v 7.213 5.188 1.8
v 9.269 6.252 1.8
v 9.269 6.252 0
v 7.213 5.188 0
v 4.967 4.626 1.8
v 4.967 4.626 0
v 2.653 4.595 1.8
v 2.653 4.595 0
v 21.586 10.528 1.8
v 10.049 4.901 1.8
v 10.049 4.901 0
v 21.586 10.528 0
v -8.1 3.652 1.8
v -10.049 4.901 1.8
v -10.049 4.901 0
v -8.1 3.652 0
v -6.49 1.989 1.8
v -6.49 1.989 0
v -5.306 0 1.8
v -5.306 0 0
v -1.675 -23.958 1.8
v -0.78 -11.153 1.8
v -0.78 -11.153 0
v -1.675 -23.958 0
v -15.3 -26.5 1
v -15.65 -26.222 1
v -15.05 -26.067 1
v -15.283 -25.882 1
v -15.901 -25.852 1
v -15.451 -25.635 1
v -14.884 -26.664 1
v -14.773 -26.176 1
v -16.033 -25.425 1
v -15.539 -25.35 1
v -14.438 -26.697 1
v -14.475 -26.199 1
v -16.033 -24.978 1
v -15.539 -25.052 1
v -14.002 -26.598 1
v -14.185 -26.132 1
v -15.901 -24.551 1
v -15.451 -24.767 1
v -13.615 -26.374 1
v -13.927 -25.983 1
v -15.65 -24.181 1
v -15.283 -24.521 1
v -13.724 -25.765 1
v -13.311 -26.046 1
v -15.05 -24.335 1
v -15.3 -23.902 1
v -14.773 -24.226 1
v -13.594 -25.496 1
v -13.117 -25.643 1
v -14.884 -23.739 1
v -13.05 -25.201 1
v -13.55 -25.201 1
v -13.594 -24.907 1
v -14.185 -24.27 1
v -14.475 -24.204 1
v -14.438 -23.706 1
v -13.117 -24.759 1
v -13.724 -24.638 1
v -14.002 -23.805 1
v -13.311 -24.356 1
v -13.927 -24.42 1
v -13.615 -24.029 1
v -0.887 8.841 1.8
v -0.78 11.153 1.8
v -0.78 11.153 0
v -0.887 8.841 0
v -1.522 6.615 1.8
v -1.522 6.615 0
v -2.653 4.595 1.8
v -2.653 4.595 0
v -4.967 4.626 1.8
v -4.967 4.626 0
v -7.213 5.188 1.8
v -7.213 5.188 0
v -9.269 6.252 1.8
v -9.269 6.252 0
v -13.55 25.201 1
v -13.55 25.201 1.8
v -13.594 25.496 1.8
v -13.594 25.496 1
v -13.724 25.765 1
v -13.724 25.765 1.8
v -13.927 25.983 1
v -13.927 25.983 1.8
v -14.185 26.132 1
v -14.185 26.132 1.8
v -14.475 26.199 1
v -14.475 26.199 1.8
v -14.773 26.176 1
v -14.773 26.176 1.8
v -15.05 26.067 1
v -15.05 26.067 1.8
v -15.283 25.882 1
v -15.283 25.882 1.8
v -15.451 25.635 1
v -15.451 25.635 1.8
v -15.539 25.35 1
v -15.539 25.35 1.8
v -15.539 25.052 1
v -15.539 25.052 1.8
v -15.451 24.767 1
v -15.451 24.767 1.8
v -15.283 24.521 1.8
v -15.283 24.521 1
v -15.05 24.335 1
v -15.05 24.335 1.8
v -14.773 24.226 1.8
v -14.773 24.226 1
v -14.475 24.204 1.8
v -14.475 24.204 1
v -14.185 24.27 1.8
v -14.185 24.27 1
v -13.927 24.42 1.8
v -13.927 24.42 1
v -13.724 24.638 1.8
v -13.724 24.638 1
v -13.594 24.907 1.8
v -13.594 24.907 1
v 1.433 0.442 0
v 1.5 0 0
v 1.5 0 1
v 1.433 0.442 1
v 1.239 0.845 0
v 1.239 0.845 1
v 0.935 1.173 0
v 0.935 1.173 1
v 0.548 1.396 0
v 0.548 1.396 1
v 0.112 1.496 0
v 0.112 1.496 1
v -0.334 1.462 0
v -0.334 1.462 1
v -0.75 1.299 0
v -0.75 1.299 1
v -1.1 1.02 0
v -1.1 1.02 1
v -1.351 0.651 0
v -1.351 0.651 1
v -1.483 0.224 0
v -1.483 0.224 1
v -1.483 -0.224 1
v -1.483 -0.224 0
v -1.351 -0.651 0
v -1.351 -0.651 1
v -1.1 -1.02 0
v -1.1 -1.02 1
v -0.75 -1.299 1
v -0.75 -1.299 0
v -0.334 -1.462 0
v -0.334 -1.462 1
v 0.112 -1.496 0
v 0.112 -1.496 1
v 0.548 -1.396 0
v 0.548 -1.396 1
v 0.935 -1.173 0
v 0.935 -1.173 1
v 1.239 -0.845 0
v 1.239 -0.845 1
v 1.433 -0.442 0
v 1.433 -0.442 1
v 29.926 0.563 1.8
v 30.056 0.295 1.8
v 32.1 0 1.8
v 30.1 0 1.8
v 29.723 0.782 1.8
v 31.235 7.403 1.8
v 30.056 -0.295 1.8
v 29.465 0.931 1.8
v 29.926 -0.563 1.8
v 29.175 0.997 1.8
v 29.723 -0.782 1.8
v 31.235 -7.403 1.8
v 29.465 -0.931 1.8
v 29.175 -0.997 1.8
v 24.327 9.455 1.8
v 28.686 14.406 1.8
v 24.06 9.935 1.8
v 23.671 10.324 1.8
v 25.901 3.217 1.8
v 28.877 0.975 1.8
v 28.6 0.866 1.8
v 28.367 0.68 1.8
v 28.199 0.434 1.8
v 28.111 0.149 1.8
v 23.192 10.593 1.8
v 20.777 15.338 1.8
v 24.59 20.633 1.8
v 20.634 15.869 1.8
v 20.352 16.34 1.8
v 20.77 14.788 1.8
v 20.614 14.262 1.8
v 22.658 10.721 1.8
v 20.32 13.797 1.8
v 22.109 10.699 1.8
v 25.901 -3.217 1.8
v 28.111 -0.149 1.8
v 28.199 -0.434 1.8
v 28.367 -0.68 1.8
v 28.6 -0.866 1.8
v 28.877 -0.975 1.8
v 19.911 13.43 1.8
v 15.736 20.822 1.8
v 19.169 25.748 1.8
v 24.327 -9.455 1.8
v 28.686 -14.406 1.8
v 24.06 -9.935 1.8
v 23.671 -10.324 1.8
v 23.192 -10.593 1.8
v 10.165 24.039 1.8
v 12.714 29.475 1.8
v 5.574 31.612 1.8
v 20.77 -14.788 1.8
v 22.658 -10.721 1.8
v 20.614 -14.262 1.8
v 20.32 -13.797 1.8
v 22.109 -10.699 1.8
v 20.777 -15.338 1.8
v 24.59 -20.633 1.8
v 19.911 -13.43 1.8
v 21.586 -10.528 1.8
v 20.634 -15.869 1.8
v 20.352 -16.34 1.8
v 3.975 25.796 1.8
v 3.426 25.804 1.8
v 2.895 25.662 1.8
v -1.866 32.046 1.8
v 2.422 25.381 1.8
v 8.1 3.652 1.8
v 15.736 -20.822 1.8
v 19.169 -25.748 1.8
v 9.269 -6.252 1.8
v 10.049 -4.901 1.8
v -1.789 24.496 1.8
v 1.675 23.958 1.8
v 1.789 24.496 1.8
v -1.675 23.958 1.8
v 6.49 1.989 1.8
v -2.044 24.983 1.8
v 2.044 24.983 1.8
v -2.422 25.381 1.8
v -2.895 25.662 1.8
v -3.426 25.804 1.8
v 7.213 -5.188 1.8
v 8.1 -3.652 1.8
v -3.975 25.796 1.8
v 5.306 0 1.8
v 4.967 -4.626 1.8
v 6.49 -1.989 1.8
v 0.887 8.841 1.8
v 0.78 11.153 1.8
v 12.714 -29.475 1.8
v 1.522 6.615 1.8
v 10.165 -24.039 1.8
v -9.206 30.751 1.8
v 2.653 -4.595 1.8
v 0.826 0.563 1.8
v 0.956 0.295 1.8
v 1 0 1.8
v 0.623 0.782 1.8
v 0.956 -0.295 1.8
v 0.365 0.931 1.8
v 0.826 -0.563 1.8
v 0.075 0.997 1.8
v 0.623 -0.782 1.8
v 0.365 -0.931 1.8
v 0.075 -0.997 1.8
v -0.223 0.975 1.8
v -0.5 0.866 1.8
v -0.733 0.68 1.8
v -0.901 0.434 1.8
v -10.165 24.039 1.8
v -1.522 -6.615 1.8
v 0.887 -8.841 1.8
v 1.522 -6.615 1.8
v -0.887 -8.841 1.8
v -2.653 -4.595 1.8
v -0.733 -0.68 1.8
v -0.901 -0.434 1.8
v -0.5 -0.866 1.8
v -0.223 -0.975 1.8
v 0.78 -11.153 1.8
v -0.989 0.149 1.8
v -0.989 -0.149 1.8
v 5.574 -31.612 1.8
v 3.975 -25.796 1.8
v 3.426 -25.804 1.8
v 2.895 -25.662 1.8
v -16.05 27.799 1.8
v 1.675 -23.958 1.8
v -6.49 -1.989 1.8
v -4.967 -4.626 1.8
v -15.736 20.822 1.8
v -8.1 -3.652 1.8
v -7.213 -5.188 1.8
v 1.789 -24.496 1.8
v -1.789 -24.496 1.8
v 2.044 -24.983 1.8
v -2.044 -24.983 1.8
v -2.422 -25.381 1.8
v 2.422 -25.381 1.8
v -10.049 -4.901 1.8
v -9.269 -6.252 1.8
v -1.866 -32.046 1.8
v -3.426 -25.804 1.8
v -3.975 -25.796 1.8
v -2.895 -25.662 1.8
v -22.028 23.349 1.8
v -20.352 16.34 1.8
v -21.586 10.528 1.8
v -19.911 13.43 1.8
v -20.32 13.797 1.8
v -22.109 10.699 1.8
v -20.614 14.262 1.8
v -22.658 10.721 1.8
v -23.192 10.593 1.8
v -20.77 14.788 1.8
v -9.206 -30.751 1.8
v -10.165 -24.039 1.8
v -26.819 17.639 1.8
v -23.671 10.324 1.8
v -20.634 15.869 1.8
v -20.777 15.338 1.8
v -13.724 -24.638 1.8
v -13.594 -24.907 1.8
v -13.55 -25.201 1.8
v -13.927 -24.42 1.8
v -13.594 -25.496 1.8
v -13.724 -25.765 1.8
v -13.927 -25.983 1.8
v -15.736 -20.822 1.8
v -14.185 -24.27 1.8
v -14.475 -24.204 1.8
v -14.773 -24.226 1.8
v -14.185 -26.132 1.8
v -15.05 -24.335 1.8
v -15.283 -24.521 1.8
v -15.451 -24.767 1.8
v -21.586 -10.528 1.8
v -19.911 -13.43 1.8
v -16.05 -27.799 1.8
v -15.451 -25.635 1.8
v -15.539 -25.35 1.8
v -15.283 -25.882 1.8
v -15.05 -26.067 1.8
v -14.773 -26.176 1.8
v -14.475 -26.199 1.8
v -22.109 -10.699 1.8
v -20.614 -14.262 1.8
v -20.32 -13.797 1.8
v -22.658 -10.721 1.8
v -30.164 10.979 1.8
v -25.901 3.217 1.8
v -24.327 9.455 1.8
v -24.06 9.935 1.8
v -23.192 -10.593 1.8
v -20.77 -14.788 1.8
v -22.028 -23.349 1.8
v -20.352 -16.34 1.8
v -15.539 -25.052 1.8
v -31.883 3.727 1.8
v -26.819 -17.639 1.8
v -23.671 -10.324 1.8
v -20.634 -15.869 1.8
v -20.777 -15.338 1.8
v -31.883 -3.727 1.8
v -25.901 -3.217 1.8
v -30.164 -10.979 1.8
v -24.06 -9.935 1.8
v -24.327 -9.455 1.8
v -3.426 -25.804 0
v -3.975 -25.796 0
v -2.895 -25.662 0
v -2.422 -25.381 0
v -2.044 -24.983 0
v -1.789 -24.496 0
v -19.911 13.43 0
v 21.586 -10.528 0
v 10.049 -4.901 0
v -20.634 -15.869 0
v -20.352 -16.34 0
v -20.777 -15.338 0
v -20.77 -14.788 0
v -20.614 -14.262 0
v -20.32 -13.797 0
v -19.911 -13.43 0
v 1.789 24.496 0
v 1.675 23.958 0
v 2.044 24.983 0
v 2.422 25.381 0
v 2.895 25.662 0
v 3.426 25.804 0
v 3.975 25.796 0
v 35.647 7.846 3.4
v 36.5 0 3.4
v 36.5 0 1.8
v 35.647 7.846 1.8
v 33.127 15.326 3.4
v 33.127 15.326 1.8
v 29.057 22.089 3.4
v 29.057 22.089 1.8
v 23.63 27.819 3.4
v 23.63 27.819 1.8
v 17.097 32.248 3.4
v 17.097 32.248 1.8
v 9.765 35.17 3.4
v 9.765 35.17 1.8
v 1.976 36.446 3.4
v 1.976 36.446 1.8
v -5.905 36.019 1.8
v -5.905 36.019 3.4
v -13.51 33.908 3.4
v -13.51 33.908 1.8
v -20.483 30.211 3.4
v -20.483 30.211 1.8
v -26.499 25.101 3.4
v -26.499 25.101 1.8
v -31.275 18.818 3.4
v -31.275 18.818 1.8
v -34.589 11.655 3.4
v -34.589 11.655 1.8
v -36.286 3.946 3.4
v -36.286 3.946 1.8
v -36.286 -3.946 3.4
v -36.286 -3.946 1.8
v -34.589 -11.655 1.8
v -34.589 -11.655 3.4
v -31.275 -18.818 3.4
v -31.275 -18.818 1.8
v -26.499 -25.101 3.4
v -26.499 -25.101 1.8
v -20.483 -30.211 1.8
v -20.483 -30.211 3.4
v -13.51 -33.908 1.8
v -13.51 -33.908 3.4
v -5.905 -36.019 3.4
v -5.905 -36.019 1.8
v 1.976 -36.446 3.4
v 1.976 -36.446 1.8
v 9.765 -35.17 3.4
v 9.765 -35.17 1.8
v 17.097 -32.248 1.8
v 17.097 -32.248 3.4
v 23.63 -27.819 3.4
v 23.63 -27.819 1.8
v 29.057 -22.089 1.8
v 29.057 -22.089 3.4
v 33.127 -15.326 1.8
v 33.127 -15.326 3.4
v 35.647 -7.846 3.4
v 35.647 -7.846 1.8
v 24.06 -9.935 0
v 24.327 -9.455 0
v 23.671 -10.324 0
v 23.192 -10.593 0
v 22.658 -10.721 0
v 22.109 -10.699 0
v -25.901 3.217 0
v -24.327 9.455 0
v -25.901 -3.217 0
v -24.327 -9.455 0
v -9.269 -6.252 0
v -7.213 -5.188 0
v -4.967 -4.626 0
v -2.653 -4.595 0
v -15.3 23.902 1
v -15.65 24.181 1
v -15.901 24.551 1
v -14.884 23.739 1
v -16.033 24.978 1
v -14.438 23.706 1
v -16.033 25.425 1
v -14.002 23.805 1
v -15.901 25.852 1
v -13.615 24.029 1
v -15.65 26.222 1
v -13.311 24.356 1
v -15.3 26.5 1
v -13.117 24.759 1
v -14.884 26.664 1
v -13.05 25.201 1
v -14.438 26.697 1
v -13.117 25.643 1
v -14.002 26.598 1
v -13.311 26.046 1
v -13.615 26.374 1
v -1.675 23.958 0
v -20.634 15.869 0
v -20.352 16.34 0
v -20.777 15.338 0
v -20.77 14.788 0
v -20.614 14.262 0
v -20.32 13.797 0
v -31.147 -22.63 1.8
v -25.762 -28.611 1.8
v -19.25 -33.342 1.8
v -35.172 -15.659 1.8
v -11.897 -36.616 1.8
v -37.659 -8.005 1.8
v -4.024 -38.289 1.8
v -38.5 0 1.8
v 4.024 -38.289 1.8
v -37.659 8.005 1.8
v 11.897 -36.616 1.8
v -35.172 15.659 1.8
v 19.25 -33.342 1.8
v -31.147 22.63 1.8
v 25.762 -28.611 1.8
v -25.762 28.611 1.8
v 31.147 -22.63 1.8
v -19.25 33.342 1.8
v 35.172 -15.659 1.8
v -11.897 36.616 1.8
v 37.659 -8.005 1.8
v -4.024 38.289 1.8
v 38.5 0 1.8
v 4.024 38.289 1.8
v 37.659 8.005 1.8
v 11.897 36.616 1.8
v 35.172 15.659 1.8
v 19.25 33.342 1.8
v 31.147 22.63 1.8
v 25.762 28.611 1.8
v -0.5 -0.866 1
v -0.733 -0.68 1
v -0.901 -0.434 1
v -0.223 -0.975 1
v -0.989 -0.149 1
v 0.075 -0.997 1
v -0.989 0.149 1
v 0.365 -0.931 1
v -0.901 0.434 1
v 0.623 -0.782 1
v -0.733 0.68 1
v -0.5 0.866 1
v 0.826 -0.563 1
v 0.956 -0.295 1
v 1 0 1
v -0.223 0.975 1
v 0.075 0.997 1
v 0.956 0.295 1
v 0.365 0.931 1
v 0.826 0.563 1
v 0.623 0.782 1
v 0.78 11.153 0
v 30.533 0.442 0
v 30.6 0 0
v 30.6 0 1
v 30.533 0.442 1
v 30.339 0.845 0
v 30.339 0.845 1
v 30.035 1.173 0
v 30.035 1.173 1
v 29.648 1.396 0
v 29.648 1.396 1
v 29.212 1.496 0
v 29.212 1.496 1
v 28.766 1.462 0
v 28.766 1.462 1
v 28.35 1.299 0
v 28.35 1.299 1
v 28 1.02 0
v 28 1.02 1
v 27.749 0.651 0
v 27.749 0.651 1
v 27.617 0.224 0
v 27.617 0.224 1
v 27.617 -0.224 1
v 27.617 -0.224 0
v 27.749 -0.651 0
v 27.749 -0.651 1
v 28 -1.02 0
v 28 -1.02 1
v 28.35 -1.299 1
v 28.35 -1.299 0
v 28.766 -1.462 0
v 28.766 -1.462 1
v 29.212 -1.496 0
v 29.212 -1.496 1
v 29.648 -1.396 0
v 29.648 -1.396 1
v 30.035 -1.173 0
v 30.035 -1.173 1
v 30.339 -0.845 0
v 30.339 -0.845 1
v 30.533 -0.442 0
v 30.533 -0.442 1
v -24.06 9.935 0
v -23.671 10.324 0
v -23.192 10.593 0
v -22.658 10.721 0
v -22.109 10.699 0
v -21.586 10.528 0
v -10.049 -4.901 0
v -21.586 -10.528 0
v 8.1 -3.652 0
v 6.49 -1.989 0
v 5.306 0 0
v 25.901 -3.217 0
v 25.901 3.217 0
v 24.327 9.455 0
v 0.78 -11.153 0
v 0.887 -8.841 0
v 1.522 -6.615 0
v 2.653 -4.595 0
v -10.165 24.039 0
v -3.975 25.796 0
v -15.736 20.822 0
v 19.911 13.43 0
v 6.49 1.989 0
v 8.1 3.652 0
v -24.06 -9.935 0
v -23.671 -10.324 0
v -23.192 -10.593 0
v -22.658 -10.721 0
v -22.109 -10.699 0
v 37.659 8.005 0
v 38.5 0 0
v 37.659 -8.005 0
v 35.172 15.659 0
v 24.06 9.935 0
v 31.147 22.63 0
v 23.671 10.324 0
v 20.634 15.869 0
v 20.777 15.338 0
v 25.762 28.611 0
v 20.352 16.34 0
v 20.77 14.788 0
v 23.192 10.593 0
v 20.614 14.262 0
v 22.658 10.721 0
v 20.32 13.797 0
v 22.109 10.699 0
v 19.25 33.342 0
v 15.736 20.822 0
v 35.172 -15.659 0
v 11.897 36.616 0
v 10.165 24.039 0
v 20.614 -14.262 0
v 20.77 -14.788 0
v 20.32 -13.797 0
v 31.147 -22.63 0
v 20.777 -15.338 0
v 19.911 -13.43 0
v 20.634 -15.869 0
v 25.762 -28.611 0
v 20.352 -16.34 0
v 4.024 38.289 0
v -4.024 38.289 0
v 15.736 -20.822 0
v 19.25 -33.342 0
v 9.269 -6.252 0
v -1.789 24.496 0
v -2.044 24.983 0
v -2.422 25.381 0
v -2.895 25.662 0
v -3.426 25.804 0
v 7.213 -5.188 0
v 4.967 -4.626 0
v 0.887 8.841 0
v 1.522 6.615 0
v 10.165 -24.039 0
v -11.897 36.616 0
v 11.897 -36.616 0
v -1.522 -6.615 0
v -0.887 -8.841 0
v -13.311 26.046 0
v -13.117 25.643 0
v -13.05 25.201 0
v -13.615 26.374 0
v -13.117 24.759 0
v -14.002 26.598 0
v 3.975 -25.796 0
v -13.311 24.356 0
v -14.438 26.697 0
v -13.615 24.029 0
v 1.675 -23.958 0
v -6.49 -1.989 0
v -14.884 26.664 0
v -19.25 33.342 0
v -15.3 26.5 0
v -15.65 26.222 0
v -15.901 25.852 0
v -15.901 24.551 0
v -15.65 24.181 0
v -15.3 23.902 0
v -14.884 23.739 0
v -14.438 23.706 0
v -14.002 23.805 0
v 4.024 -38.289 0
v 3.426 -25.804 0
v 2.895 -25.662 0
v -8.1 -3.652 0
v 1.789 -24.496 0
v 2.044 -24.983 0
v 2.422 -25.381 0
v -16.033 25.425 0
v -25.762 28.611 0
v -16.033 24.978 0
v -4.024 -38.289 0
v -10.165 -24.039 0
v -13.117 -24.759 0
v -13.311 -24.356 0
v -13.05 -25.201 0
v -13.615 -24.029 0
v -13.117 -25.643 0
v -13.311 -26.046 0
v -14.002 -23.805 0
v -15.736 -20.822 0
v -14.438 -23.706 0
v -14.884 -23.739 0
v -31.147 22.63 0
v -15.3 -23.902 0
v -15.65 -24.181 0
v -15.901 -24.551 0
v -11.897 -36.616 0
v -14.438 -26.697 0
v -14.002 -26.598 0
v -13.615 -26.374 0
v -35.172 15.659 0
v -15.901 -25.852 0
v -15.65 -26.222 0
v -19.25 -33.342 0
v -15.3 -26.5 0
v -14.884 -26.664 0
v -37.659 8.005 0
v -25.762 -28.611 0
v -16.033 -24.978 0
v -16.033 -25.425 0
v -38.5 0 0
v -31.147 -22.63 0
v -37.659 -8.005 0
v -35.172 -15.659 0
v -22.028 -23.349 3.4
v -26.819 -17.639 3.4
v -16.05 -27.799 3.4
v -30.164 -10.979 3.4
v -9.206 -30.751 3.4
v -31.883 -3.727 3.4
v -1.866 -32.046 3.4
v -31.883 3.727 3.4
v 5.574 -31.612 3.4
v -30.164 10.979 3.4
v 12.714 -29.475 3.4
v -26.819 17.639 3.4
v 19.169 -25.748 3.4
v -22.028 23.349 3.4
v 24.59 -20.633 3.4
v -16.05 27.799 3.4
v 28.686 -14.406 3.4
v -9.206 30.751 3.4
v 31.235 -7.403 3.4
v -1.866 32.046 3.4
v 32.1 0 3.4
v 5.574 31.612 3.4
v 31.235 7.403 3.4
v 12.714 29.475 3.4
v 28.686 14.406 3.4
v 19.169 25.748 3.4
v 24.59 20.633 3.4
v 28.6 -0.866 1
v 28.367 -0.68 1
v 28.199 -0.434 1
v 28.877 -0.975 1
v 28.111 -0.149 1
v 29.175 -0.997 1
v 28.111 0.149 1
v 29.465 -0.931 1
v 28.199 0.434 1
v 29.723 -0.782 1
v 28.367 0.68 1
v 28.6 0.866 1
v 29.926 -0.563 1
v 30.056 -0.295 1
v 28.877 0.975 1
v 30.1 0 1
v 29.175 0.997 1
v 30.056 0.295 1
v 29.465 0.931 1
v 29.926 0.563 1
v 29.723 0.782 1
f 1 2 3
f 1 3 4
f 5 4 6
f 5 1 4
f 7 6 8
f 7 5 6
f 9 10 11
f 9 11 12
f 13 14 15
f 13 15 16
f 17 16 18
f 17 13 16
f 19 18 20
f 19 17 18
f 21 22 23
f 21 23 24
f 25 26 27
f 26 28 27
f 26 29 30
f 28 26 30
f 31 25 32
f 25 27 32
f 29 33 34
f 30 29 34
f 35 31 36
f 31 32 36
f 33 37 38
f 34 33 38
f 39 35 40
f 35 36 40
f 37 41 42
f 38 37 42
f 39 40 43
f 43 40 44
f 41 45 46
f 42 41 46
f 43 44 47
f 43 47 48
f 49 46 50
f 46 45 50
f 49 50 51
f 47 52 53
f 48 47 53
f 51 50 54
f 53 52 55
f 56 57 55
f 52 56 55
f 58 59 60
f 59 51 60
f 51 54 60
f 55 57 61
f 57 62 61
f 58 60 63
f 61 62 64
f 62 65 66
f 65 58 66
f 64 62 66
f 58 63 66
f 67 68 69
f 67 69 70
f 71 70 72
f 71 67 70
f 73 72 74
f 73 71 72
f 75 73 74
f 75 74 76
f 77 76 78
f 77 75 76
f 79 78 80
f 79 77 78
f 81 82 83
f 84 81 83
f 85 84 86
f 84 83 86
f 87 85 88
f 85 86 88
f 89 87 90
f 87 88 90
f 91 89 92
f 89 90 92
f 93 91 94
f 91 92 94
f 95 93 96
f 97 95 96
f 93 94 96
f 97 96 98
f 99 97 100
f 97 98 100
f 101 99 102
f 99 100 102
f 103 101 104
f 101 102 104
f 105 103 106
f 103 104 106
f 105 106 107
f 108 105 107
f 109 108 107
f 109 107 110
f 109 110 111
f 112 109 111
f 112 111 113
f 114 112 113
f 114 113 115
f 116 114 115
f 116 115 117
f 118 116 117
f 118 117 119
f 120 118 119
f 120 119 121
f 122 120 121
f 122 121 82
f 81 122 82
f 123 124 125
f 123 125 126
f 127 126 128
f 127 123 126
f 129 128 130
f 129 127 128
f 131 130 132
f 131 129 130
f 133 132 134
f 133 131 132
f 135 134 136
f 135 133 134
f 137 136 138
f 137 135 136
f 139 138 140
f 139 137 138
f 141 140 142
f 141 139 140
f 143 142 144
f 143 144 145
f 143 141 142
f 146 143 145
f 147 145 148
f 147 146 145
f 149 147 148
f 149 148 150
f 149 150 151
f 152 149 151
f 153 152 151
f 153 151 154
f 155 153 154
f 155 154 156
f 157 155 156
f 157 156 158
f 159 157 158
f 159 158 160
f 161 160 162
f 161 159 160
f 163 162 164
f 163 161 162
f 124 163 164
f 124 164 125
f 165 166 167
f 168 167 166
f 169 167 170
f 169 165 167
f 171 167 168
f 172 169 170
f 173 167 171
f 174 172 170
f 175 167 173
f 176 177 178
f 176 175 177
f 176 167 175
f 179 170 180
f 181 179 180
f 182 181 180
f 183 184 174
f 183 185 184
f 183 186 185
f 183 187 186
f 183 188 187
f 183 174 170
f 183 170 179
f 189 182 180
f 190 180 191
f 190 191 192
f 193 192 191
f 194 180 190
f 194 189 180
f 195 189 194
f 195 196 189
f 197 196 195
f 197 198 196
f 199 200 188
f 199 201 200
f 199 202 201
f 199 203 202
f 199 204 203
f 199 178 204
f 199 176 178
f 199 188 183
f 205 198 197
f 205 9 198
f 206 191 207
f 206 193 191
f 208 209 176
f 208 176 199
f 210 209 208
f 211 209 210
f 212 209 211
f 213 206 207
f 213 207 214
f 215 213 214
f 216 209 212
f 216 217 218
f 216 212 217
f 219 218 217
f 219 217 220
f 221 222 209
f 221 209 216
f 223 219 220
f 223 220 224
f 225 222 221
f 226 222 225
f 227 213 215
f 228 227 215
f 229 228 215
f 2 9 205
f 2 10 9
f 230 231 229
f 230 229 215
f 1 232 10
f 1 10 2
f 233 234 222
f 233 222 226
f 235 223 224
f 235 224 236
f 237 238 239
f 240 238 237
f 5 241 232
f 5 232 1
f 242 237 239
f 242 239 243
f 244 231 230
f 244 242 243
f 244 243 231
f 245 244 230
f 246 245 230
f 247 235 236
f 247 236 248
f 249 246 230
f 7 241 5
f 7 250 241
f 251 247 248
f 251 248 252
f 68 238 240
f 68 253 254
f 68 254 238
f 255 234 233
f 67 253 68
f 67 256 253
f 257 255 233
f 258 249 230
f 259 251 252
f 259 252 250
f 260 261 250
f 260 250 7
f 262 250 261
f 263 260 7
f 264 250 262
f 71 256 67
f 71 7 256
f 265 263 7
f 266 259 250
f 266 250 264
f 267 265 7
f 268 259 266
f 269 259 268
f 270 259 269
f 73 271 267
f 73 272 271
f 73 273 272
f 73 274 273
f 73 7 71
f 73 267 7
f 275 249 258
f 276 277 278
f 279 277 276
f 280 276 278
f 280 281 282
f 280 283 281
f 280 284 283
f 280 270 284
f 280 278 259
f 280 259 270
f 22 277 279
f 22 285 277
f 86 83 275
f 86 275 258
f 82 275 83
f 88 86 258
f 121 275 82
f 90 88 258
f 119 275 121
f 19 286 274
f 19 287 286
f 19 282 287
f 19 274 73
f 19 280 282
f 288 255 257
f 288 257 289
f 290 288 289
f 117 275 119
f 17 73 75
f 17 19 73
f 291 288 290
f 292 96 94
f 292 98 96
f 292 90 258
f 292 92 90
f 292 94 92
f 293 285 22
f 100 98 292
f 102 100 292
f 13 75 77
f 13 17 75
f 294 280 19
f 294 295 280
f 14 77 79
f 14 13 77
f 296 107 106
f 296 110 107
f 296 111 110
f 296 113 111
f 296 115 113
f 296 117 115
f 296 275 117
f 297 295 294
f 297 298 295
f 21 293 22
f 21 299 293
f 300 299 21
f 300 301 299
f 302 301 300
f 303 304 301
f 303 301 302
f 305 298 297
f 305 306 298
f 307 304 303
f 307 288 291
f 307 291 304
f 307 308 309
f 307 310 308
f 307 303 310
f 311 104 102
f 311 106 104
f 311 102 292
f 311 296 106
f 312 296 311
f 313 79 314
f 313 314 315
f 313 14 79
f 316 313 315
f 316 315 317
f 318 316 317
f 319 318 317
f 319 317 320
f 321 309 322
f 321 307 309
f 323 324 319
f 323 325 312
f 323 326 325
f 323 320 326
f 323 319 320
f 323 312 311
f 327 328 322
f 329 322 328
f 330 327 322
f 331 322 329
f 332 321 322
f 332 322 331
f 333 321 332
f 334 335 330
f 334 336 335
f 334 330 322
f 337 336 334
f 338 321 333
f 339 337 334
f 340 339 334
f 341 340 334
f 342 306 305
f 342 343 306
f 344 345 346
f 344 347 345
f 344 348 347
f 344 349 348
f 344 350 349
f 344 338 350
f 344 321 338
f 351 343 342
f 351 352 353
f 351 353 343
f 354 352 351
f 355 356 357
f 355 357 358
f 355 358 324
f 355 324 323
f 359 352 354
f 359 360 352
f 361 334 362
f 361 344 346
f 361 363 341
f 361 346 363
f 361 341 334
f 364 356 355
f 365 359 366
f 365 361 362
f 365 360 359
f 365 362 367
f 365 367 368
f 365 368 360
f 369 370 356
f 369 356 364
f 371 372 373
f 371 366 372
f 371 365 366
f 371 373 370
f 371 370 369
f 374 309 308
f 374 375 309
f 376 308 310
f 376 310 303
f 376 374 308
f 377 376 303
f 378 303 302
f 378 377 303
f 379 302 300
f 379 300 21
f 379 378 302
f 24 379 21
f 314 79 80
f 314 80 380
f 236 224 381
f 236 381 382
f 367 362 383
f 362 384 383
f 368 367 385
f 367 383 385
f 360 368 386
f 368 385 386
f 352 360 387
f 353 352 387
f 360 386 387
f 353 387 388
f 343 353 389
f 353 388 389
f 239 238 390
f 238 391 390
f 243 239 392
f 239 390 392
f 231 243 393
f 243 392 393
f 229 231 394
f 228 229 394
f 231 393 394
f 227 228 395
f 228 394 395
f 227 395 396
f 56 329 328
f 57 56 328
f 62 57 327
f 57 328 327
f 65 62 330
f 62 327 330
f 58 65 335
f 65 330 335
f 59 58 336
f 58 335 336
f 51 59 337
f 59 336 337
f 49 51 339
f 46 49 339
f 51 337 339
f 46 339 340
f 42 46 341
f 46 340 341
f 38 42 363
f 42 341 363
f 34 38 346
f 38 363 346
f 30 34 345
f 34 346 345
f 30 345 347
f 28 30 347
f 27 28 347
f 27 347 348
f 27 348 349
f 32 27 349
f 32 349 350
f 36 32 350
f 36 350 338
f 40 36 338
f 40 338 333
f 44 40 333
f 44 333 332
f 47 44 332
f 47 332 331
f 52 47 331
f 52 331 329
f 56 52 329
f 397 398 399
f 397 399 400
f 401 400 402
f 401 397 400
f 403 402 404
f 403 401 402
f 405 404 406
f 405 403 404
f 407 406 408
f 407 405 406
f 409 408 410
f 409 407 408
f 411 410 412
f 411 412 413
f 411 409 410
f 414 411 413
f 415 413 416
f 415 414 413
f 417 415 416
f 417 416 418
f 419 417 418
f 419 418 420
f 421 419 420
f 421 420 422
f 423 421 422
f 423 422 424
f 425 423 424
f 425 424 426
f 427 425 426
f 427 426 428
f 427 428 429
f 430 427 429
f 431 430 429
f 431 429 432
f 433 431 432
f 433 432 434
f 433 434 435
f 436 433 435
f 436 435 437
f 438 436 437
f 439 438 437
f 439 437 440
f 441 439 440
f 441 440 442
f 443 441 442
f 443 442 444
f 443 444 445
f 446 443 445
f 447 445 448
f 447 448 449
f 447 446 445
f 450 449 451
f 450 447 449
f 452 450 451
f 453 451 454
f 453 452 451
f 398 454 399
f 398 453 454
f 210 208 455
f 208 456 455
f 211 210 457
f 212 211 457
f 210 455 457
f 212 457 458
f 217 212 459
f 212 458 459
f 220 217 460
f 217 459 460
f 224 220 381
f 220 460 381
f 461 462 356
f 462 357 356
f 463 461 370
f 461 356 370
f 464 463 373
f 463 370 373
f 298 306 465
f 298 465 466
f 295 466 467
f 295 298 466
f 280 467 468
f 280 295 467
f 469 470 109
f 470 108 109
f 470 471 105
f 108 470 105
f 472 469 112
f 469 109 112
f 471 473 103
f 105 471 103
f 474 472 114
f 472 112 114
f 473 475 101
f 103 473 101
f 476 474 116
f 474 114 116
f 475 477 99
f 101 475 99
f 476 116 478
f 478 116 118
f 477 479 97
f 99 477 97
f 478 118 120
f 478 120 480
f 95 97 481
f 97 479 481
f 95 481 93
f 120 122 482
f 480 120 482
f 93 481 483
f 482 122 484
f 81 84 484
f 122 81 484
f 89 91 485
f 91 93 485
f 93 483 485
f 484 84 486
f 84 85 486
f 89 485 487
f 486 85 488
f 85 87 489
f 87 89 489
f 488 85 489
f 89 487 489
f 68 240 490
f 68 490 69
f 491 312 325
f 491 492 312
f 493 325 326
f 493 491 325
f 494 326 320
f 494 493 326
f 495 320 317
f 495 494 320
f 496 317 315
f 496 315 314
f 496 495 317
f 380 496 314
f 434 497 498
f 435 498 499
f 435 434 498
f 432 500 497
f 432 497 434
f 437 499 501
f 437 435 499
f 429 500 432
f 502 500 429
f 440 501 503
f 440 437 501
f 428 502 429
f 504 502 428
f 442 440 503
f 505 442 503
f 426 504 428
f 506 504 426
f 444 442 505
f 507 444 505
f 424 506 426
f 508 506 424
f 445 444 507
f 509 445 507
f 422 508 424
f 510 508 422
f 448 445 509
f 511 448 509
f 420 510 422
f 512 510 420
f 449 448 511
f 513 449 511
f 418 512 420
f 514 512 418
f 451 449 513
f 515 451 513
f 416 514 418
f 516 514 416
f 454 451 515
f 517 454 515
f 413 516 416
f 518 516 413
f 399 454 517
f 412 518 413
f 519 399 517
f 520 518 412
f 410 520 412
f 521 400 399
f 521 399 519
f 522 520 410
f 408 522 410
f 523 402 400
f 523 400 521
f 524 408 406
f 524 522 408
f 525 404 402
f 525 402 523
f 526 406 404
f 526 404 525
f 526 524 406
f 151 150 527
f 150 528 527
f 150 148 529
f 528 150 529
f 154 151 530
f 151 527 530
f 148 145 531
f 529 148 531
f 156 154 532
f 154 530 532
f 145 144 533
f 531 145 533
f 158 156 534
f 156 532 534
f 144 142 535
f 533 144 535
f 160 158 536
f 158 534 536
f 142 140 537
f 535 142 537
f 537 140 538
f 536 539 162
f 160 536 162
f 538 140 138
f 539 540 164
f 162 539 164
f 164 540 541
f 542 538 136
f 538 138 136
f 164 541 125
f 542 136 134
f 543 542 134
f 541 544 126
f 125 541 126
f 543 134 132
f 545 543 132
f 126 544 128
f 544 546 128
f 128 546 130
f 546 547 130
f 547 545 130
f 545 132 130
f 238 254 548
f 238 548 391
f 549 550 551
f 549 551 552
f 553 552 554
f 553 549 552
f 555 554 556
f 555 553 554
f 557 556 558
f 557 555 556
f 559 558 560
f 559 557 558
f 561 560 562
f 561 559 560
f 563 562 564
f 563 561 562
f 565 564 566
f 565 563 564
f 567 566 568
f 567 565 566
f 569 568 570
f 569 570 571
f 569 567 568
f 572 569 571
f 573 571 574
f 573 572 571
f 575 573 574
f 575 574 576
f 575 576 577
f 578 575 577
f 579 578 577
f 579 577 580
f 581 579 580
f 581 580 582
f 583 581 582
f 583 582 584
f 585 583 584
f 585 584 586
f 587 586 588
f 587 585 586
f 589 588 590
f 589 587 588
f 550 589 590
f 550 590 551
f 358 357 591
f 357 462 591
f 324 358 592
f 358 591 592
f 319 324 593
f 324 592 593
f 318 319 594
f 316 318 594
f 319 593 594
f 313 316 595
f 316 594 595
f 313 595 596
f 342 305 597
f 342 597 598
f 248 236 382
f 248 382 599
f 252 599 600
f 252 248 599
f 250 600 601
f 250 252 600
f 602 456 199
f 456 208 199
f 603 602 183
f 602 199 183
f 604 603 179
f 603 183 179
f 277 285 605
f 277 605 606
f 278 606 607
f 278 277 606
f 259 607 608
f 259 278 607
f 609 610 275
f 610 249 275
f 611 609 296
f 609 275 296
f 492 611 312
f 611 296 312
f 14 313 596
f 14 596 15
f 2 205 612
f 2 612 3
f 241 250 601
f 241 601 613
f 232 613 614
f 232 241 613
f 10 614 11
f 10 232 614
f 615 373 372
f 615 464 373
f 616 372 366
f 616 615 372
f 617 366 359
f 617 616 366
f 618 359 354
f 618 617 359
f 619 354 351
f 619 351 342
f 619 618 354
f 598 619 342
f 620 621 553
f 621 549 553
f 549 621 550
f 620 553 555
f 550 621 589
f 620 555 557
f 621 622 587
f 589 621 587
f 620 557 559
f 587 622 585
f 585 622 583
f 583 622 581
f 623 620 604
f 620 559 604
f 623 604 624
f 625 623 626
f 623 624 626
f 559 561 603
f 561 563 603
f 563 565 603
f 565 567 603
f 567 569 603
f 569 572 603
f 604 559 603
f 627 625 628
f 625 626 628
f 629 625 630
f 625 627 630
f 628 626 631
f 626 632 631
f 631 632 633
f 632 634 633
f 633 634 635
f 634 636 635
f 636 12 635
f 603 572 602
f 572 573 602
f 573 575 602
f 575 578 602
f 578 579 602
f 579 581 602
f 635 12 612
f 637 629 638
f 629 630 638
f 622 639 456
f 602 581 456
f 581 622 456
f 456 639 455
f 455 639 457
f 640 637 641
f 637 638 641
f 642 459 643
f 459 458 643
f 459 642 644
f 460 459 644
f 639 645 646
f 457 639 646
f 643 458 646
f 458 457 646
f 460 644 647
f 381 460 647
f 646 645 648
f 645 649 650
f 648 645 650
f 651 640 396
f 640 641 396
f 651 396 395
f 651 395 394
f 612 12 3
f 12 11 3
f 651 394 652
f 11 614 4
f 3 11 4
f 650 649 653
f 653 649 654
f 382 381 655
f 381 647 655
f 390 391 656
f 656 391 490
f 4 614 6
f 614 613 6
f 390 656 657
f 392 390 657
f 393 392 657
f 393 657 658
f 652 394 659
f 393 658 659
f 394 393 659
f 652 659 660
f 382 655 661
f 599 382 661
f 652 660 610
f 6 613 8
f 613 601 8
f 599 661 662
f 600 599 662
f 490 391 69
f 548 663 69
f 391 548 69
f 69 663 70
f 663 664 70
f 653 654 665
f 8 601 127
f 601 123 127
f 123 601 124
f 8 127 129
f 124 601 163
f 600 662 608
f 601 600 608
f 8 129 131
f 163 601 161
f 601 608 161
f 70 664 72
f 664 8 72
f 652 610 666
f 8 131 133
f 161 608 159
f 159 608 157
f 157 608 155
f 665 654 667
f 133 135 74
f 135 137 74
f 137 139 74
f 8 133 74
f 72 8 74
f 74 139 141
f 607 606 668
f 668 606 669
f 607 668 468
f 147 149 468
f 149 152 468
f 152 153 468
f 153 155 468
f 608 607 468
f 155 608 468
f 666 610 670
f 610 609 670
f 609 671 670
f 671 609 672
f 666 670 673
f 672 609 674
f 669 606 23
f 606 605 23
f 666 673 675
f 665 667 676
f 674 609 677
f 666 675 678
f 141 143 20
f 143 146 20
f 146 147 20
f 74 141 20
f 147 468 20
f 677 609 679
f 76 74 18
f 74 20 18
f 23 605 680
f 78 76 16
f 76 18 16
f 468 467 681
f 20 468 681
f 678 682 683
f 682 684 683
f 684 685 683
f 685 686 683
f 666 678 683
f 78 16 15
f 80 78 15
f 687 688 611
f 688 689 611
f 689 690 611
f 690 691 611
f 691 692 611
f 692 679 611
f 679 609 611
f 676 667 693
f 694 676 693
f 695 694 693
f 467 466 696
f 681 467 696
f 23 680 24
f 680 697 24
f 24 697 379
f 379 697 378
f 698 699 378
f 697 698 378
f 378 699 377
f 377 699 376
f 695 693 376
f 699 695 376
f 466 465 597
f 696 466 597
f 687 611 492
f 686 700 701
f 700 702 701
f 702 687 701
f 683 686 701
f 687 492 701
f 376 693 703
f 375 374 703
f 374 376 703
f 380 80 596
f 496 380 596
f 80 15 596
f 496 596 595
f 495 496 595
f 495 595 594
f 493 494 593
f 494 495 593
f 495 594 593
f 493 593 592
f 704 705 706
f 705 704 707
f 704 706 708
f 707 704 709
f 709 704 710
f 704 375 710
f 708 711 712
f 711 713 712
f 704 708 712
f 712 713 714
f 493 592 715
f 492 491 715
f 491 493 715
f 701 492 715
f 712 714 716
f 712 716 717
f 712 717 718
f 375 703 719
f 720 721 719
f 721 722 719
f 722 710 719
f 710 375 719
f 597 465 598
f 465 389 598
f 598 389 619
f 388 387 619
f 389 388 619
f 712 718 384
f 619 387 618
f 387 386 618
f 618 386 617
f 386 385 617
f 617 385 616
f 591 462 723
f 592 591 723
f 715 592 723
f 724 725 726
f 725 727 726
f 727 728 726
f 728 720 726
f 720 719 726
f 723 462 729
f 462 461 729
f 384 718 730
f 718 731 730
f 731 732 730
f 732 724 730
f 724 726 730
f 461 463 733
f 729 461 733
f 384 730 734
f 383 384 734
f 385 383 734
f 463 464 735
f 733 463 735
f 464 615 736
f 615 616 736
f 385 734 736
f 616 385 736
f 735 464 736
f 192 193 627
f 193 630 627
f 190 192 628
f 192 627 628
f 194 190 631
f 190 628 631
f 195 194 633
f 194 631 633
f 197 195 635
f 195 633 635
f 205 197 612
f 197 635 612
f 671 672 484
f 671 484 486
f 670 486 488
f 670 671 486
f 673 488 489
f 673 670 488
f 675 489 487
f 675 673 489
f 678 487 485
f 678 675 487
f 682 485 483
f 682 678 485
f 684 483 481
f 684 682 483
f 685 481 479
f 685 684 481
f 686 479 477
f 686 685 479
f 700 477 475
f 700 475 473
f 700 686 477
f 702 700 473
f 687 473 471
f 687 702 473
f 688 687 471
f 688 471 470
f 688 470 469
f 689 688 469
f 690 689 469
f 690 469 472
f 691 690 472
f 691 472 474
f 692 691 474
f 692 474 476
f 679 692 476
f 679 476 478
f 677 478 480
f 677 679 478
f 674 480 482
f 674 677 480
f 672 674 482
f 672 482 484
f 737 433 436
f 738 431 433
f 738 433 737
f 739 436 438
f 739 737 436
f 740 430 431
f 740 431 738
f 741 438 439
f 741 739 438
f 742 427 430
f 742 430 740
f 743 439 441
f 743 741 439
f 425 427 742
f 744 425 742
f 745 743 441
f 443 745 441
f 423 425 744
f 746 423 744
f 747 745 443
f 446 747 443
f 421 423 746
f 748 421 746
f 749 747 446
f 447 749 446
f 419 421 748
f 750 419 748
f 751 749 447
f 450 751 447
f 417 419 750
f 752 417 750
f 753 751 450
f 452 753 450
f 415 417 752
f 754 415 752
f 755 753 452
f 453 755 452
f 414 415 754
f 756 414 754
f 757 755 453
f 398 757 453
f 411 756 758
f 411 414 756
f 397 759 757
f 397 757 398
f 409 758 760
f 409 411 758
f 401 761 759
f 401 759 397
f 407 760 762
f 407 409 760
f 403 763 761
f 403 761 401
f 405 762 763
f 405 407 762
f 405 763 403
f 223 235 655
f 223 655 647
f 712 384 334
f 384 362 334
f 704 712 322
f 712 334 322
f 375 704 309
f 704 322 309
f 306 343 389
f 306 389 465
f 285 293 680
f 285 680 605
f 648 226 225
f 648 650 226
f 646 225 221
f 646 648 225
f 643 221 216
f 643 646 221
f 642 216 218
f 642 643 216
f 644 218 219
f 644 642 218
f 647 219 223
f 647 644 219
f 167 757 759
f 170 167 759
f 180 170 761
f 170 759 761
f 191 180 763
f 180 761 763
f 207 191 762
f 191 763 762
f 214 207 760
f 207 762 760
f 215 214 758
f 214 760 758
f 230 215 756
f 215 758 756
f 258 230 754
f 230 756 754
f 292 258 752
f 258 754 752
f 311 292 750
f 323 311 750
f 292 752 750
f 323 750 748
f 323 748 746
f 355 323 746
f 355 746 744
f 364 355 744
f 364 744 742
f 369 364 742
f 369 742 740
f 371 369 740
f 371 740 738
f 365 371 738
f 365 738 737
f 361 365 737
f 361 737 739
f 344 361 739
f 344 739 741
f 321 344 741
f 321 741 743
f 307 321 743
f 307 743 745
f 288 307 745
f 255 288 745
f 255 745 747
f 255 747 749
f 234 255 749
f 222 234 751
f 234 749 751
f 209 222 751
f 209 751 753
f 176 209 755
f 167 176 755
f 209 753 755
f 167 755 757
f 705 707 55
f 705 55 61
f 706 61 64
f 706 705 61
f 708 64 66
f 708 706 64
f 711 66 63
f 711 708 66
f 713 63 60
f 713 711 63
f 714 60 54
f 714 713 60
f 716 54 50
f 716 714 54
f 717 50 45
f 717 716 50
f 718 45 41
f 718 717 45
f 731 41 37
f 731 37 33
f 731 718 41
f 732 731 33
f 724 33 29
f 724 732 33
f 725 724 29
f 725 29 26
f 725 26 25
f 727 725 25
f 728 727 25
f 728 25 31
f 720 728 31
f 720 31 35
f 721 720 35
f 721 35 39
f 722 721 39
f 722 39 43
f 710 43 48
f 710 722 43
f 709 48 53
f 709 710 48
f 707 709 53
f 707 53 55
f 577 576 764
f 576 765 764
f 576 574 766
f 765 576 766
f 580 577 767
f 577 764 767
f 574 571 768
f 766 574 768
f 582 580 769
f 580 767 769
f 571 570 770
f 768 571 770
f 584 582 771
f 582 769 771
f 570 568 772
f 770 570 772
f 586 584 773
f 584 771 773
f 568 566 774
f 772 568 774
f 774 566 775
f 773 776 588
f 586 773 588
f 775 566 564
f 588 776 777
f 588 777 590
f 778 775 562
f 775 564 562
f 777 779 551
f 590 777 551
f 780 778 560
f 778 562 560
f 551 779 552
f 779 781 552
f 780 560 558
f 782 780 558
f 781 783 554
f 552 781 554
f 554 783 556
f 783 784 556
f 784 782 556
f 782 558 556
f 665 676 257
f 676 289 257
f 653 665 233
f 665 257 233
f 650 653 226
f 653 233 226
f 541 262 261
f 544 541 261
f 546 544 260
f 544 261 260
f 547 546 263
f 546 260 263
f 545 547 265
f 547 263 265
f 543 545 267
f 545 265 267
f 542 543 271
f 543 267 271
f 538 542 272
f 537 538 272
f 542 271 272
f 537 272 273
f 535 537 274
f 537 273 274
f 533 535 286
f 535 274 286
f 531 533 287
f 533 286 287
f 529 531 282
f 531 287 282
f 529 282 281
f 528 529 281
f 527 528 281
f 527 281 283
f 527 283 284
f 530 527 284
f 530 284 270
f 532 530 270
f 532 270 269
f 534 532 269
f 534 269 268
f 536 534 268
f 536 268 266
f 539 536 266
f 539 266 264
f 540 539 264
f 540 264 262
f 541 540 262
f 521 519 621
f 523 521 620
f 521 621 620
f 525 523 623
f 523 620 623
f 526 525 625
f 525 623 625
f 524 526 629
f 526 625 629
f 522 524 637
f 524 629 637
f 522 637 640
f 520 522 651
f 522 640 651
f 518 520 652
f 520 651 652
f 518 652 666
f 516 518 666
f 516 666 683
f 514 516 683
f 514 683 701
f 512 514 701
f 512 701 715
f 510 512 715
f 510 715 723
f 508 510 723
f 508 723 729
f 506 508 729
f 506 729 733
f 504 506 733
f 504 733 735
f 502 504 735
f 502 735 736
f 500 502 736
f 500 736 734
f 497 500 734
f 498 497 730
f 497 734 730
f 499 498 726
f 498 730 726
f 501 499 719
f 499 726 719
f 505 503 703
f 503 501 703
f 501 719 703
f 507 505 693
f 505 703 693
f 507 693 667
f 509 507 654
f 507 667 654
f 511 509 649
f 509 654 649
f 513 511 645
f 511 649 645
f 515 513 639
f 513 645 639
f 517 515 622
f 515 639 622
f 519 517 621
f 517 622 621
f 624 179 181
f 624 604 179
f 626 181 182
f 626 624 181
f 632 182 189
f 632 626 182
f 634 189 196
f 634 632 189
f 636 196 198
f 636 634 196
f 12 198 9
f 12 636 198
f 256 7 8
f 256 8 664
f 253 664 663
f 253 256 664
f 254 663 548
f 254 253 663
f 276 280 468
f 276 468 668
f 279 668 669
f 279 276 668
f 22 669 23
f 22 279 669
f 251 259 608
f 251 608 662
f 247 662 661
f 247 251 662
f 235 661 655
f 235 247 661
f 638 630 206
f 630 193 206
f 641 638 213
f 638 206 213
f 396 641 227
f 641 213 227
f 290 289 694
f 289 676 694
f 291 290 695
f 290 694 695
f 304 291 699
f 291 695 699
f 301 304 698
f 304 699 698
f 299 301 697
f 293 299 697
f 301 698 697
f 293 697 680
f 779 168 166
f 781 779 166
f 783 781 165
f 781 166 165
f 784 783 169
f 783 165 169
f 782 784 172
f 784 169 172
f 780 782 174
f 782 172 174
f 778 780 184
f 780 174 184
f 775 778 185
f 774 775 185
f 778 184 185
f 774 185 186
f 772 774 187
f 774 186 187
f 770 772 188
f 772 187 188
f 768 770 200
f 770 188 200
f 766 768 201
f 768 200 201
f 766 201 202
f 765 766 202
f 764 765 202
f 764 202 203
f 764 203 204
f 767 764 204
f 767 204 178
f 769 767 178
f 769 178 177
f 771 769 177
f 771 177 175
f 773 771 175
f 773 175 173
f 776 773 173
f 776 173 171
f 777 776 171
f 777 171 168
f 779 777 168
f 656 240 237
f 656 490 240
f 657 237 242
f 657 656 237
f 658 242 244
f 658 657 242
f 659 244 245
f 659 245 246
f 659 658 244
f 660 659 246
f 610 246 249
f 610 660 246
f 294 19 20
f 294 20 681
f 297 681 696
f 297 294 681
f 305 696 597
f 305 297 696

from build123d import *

# Parameters (mm, degrees)
SKETCH_1_R                       = 38.5
EXTRUDE_1_DEPTH                  = 2
SKETCH_2_OUTSIDE_W               = 100.782
SKETCH_2_OUTSIDE_H               = 100.782
SKETCH_2_OUTSIDE_R               = 36.5
SKETCH_2_OUTSIDE_R_2             = 32.1
CUT_EXTRUDE_1_DEPTH              = 0.2
EXTRUDE_START                    = 1.4
SKETCH_2_2_R                     = 36.5
SKETCH_2_2_R_2                   = 32.1
EXTRUDE_2_DEPTH                  = 1.4
SKETCH_3_R                       = 26.1
CUT_EXTRUDE_2_DEPTH              = 55.47696761
SKETCH_3_3_R                     = 5
EXTRUDE_3_DEPTH                  = 1.8
EXTRUDE_4_DEPTH                  = 1.8
FILLET_1_R                       = 2
PATTERN_CIRCULAR_1_COUNT         = 6
FILLET_1_OF_PATTERN_CIRCULAR_1_R = 2
FILLET_2_R                       = 10
SKETCH_4_R                       = 1
CUT_EXTRUDE_3_DEPTH              = 55.47696761
CUT_EXTRUDE_START                = -1.8
SKETCH_4_3_R                     = 1.5
CUT_EXTRUDE_4_DEPTH              = 1


with BuildPart() as part:
    # 草图1 → 凸台-拉伸1 (new body)
    with BuildSketch(Plane.XY):
        Circle(SKETCH_1_R)
    extrude(amount=EXTRUDE_1_DEPTH)

    # 草图2 outside → 切除-拉伸1 (cut)
    # profile 1 of 2: a face of its own
    with BuildSketch(Plane.XY.offset(2)):
        Rectangle(SKETCH_2_OUTSIDE_W, SKETCH_2_OUTSIDE_H)
        Circle(SKETCH_2_OUTSIDE_R, mode=Mode.SUBTRACT)
    # profile 2 of 2: a face of its own
    with BuildSketch(Plane.XY.offset(2)):
        Circle(SKETCH_2_OUTSIDE_R_2)
    extrude(amount=-CUT_EXTRUDE_1_DEPTH, mode=Mode.SUBTRACT)

    # 草图2<2> → 凸台-拉伸2 (add)
    with BuildSketch(Plane.XY.offset(2).offset(EXTRUDE_START)):
        Circle(SKETCH_2_2_R)
        Circle(SKETCH_2_2_R_2, mode=Mode.SUBTRACT)
    extrude(amount=-EXTRUDE_2_DEPTH)

    # 草图3 → 切除-拉伸2 (cut, through all)
    with BuildSketch(Plane.XY.offset(1.8)):
        Circle(SKETCH_3_R)
    extrude(amount=-CUT_EXTRUDE_2_DEPTH, mode=Mode.SUBTRACT)



with BuildPart() as body_2:
    # 草图3<3> → 凸台-拉伸3 (new, through all)
    with BuildSketch(Plane.XY.offset(1.8)):
        Circle(SKETCH_3_3_R)
    extrude(amount=-EXTRUDE_3_DEPTH)


with BuildPart() as part_1:
    add(part.part)

    add(body_2.part)  # 凸台-拉伸4 merges body 2
    # 草图3<4> → 凸台-拉伸4 (add, through all)
    with BuildSketch(Plane.XY.offset(1.8)):
        with BuildLine():
            ThreePointArc((1.820643965, 26.036421712), (0, 26.1), (-1.820643965, 26.036421712))
            Line((-1.820643965, 26.036421712), (-0.348782369, 4.987820251))
            ThreePointArc((-0.348782369, 4.987820251), (0, 5), (0.348782369, 4.987820251))
            Line((0.348782369, 4.987820251), (1.820643965, 26.036421712))
        make_face()
    extrude_4 = extrude(amount=-EXTRUDE_4_DEPTH)

    # 圆角1
    fillet_1_edges = [part_1.edges().sort_by_distance(p)[0] for p in [
        (-1.820643965, 26.036421712, 0.9),
        (1.820643965, 26.036421712, 0.9),
    ]]
    fillet(fillet_1_edges, radius=FILLET_1_R)

    # 阵列(圆周)1: 凸台-拉伸4 ×6 about axis
    pattern_circular_1_axis = Axis((0, 0, 0), (0, 0, 1))
    for i in range(1, PATTERN_CIRCULAR_1_COUNT):
        add(extrude_4.rotate(pattern_circular_1_axis, i * 360 / PATTERN_CIRCULAR_1_COUNT))

    # 圆角1 of 阵列(圆周)1
    fillet_1_of_pattern_circular_1_edges = [part_1.edges().sort_by_distance(p)[0] for p in [
        (-23.458524608, 11.441486931, 0.9),
        (-21.637880644, 14.594934781, 0.9),
        (-21.637880644, -14.594934781, 0.9),
        (-23.458524608, -11.441486931, 0.9),
        (1.820643965, -26.036421712, 0.9),
        (-1.820643965, -26.036421712, 0.9),
        (23.458524608, -11.441486931, 0.9),
        (21.637880644, -14.594934781, 0.9),
        (21.637880644, 14.594934781, 0.9),
        (23.458524608, 11.441486931, 0.9),
    ]]
    fillet(fillet_1_of_pattern_circular_1_edges, radius=FILLET_1_OF_PATTERN_CIRCULAR_1_R)

    # 圆角2
    # the kernel refuses this fillet: 10 mm, written as the material it adds along each edge
    with BuildSketch(Plane(origin=(4.493970231, -2.191855734, 1.8), x_dir=(0.8987940462991597, -0.4383711467890922, 0), z_dir=(0, 0, -1)), Plane(origin=(0.348782369, -4.987820251, 1.8), x_dir=(0.06975647374410966, -0.9975640502598253, 0), z_dir=(0, 0, -1)), Plane(origin=(-4.145187863, -2.795964517, 1.8), x_dir=(-0.8290375725550504, -0.5591929034707338, 0), z_dir=(0, 0, -1)), Plane(origin=(-4.493970231, 2.191855734, 1.8), x_dir=(-0.8987940462991602, 0.4383711467890914, 0), z_dir=(0, 0, -1)), Plane(origin=(-0.348782369, 4.987820251, 1.8), x_dir=(-0.06975647374410977, 0.9975640502598253, 0), z_dir=(0, 0, -1)), Plane(origin=(4.145187863, 2.795964517, 1.8), x_dir=(0.8290375725550504, 0.5591929034707338, 0), z_dir=(0, 0, -1))) as fillet_2_piece_1:
        with BuildLine():
            CenterArc((6.180339887, -10), FILLET_2_R, 90, 48.189685104)
            ThreePointArc((-1.273220038, -3.333333333), (-0.329138205, -1.784110449), (0, 0))
            Line((0, 0), (6.180339887, 0))
        make_face()
    extrude(amount=1.8)
    with BuildSketch(Plane(origin=(4.493970231, 2.191855734, 1.8), x_dir=(0.8987940462991614, 0.4383711467890888, 0), z_dir=(0, 0, -1)), Plane(origin=(4.145187863, -2.795964517, 1.8), x_dir=(0.8290375725550488, -0.5591929034707364, 0), z_dir=(0, 0, -1)), Plane(origin=(-0.348782369, -4.987820251, 1.8), x_dir=(-0.06975647374411244, -0.9975640502598251, 0), z_dir=(0, 0, -1)), Plane(origin=(-4.493970231, -2.191855734, 1.8), x_dir=(-0.8987940462991615, -0.43837114678908895, 0), z_dir=(0, 0, -1)), Plane(origin=(-4.145187863, 2.795964517, 1.8), x_dir=(-0.8290375725550488, 0.5591929034707362, 0), z_dir=(0, 0, -1)), Plane(origin=(0.348782369, 4.987820251, 1.8), x_dir=(0.06975647374411233, 0.9975640502598251, 0), z_dir=(0, 0, -1))) as fillet_2_piece_2:
        with BuildLine():
            CenterArc((6.180339887, 10), FILLET_2_R, 221.810314896, 48.189685104)
            ThreePointArc((-1.273220038, 3.333333333), (-0.329138205, 1.784110449), (0, 0))
            Line((0, 0), (6.180339887, 0))
        make_face()
    extrude(amount=1.8)

    # 草图4 → 切除-拉伸3 (cut, through all)
    with BuildSketch(Plane.XY.offset(1.8)):
        with Locations((-14.55, 25.20133925)):
            Circle(SKETCH_4_R)
        Circle(SKETCH_4_R)
        with Locations((29.1, 0)):
            Circle(SKETCH_4_R)
        with Locations((-14.55, -25.20133925)):
            Circle(SKETCH_4_R)
    extrude(amount=-CUT_EXTRUDE_3_DEPTH, mode=Mode.SUBTRACT)

    # 草图4<3> → 切除-拉伸4 (cut)
    with BuildSketch(Plane.XY.offset(1.8).offset(CUT_EXTRUDE_START)):
        with Locations((-14.55, 25.20133925)):
            Circle(SKETCH_4_3_R)
        with Locations((29.1, 0)):
            Circle(SKETCH_4_3_R)
        with Locations((-14.55, -25.20133925)):
            Circle(SKETCH_4_3_R)
        Circle(SKETCH_4_3_R)
    extrude(amount=CUT_EXTRUDE_4_DEPTH, mode=Mode.SUBTRACT)


solid = part_1.part
